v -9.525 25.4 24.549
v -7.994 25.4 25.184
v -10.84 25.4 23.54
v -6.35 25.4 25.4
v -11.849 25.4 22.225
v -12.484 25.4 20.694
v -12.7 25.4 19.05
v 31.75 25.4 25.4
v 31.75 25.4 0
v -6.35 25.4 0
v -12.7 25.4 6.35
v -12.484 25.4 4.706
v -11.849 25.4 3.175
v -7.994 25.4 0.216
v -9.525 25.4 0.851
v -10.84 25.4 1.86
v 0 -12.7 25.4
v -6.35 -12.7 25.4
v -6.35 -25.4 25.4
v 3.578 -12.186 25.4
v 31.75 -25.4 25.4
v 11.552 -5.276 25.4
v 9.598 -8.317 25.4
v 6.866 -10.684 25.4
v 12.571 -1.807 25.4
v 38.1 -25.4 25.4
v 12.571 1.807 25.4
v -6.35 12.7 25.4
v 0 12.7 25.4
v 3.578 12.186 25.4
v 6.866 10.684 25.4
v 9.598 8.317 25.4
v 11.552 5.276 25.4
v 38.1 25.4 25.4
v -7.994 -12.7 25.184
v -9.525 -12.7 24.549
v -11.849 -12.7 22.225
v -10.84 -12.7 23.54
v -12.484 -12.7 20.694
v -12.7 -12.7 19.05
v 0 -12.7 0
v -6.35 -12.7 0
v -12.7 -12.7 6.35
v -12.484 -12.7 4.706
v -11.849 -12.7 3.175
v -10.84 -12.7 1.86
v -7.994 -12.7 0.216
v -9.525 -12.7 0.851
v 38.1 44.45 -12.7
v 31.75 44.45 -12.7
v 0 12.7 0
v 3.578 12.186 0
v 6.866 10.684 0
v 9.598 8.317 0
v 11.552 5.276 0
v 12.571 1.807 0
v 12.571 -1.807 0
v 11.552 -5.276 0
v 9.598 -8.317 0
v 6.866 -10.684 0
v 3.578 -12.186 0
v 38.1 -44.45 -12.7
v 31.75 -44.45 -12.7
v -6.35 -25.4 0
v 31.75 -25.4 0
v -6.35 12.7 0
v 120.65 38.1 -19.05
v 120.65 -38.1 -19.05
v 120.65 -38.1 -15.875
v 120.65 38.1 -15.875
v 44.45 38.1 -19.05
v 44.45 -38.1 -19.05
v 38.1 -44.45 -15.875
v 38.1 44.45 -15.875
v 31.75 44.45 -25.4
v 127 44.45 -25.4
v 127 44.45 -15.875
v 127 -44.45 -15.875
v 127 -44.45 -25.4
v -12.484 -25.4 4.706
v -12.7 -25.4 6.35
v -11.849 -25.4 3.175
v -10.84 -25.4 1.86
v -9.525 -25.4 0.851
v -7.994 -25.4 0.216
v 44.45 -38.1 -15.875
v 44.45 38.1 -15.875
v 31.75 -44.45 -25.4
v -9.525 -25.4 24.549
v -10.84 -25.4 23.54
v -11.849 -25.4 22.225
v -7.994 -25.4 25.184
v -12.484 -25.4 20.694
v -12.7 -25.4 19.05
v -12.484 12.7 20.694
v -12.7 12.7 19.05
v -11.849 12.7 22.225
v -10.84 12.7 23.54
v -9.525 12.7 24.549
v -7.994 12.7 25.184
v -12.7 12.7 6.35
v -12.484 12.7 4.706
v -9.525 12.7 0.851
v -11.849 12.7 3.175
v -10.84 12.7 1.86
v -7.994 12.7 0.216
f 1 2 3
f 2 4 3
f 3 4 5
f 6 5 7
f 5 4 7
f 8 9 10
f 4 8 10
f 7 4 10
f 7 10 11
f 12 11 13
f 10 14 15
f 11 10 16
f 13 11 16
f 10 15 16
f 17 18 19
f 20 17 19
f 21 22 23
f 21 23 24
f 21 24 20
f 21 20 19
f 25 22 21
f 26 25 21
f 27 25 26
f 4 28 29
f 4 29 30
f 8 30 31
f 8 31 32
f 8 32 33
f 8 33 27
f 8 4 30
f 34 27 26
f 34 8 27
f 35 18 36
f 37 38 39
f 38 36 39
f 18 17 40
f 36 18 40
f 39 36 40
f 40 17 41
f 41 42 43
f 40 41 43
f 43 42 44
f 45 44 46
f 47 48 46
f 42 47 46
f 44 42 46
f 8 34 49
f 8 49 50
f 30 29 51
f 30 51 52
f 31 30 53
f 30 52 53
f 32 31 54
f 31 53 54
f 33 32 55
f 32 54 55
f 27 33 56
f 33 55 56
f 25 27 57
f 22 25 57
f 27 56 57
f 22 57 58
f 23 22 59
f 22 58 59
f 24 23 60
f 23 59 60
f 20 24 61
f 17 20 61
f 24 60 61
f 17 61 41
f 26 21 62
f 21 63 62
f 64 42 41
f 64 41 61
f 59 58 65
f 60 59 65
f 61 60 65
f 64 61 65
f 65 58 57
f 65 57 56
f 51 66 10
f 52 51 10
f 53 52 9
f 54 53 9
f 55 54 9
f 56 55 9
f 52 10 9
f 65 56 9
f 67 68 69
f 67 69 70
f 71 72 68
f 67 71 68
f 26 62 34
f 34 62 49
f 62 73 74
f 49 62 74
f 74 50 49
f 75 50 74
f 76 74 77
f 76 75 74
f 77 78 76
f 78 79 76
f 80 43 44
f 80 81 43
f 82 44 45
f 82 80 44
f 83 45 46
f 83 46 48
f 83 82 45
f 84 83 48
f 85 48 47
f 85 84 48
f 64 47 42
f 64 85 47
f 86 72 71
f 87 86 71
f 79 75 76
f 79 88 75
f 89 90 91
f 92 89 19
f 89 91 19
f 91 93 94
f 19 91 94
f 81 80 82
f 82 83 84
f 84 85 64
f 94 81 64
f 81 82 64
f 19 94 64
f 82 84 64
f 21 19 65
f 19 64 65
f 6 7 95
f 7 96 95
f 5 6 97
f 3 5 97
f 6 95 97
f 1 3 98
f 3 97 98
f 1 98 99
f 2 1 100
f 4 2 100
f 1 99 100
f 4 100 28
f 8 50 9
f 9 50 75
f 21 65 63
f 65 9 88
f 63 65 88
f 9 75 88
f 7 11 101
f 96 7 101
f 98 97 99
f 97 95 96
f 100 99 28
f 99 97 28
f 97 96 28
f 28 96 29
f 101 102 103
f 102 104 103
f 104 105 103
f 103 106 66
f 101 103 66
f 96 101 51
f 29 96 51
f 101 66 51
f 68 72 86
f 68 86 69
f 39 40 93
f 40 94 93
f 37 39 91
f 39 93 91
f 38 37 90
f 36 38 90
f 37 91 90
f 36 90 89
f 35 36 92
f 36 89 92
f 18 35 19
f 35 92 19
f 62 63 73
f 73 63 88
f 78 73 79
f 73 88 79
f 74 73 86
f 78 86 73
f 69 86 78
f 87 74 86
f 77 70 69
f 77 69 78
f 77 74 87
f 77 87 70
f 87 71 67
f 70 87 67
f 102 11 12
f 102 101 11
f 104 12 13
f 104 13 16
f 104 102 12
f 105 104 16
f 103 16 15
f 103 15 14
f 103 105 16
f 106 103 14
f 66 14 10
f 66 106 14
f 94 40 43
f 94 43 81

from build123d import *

# Parameters (mm, degrees)
F1_DEPTH  = 25.4
F2_R      = 6.35
F4_W      = 6.35
F4_H      = 88.9
F5_DEPTH  = 12.7
F6_W      = 6.35
F6_H      = 50.8
F5_FACE_W = 6.35
F5_FACE_H = 88.9
F8_W      = 88.9
F8_H      = 88.9
F9_DEPTH  = 6.35
F10_W     = 88.9
F10_H     = 88.9
F10_W_2   = 76.2
F10_H_2   = 76.2
F11_DEPTH = 3.175


with BuildPart() as f1:
    # F0 (on Top) → F1 (new body)
    with BuildSketch(Plane.XY):
        with BuildLine():
            ThreePointArc((0, 12.7), (12.7, 0), (0, -12.7))
            Line((0, -12.7), (-12.7, -12.7))
            Line((-12.7, -12.7), (-12.7, -25.4))
            Line((-12.7, -25.4), (38.1, -25.4))
            Line((38.1, -25.4), (38.1, 25.4))
            Line((38.1, 25.4), (-12.7, 25.4))
            Line((-12.7, 25.4), (-12.7, 12.7))
            Line((-12.7, 12.7), (0, 12.7))
        make_face()
    extrude(amount=F1_DEPTH)

    # F2
    f2_edges = [f1.edges().sort_by_distance(p)[0] for p in [
        (-12.7, -19.05, 25.4),
        (-12.7, 19.05, 25.4),
        (-12.7, -19.05, 0),
        (-12.7, 19.05, 0),
    ]]
    fillet(f2_edges, radius=F2_R)



with BuildPart() as f5:
    # F4 (on offset) → F5 (new body)
    with BuildSketch(Plane.XY.offset(-25.4)):
        with Locations((34.925, 0)):
            Rectangle(F4_W, F4_H)
    extrude(amount=F5_DEPTH)


with BuildPart() as f1_1:
    add(f1.part)

    add(f5.part)  # F7 merges F5
    # F6 (on face) → F7 section 0
    with BuildSketch(Plane.XY.offset(25.4)):
        with Locations((34.925, 0)):
            Rectangle(F6_W, F6_H)
    # F5_face (on face) → F7 section 1
    with BuildSketch(Plane(origin=(34.925, 0, -12.7), x_dir=(1, 0, 0), z_dir=(0, 0, 1))):
        Rectangle(F5_FACE_W, F5_FACE_H)
    loft()

    # F8 (on face) → F9 (join)
    with BuildSketch(Plane(origin=(0, 0, -25.4), x_dir=(1, 0, 0), z_dir=(0, 0, -1))):
        with Locations((82.55, 0)):
            Rectangle(F8_W, F8_H)
    extrude(amount=-F9_DEPTH)

    # F10 (on face) → F11 (join)
    with BuildSketch(Plane.XY.offset(-19.05)):
        with Locations((82.55, 0)):
            Rectangle(F10_W, F10_H)
        with Locations((82.55, 0)):
            Rectangle(F10_W_2, F10_H_2, mode=Mode.SUBTRACT)
    extrude(amount=F11_DEPTH)


solid = f1_1.part
